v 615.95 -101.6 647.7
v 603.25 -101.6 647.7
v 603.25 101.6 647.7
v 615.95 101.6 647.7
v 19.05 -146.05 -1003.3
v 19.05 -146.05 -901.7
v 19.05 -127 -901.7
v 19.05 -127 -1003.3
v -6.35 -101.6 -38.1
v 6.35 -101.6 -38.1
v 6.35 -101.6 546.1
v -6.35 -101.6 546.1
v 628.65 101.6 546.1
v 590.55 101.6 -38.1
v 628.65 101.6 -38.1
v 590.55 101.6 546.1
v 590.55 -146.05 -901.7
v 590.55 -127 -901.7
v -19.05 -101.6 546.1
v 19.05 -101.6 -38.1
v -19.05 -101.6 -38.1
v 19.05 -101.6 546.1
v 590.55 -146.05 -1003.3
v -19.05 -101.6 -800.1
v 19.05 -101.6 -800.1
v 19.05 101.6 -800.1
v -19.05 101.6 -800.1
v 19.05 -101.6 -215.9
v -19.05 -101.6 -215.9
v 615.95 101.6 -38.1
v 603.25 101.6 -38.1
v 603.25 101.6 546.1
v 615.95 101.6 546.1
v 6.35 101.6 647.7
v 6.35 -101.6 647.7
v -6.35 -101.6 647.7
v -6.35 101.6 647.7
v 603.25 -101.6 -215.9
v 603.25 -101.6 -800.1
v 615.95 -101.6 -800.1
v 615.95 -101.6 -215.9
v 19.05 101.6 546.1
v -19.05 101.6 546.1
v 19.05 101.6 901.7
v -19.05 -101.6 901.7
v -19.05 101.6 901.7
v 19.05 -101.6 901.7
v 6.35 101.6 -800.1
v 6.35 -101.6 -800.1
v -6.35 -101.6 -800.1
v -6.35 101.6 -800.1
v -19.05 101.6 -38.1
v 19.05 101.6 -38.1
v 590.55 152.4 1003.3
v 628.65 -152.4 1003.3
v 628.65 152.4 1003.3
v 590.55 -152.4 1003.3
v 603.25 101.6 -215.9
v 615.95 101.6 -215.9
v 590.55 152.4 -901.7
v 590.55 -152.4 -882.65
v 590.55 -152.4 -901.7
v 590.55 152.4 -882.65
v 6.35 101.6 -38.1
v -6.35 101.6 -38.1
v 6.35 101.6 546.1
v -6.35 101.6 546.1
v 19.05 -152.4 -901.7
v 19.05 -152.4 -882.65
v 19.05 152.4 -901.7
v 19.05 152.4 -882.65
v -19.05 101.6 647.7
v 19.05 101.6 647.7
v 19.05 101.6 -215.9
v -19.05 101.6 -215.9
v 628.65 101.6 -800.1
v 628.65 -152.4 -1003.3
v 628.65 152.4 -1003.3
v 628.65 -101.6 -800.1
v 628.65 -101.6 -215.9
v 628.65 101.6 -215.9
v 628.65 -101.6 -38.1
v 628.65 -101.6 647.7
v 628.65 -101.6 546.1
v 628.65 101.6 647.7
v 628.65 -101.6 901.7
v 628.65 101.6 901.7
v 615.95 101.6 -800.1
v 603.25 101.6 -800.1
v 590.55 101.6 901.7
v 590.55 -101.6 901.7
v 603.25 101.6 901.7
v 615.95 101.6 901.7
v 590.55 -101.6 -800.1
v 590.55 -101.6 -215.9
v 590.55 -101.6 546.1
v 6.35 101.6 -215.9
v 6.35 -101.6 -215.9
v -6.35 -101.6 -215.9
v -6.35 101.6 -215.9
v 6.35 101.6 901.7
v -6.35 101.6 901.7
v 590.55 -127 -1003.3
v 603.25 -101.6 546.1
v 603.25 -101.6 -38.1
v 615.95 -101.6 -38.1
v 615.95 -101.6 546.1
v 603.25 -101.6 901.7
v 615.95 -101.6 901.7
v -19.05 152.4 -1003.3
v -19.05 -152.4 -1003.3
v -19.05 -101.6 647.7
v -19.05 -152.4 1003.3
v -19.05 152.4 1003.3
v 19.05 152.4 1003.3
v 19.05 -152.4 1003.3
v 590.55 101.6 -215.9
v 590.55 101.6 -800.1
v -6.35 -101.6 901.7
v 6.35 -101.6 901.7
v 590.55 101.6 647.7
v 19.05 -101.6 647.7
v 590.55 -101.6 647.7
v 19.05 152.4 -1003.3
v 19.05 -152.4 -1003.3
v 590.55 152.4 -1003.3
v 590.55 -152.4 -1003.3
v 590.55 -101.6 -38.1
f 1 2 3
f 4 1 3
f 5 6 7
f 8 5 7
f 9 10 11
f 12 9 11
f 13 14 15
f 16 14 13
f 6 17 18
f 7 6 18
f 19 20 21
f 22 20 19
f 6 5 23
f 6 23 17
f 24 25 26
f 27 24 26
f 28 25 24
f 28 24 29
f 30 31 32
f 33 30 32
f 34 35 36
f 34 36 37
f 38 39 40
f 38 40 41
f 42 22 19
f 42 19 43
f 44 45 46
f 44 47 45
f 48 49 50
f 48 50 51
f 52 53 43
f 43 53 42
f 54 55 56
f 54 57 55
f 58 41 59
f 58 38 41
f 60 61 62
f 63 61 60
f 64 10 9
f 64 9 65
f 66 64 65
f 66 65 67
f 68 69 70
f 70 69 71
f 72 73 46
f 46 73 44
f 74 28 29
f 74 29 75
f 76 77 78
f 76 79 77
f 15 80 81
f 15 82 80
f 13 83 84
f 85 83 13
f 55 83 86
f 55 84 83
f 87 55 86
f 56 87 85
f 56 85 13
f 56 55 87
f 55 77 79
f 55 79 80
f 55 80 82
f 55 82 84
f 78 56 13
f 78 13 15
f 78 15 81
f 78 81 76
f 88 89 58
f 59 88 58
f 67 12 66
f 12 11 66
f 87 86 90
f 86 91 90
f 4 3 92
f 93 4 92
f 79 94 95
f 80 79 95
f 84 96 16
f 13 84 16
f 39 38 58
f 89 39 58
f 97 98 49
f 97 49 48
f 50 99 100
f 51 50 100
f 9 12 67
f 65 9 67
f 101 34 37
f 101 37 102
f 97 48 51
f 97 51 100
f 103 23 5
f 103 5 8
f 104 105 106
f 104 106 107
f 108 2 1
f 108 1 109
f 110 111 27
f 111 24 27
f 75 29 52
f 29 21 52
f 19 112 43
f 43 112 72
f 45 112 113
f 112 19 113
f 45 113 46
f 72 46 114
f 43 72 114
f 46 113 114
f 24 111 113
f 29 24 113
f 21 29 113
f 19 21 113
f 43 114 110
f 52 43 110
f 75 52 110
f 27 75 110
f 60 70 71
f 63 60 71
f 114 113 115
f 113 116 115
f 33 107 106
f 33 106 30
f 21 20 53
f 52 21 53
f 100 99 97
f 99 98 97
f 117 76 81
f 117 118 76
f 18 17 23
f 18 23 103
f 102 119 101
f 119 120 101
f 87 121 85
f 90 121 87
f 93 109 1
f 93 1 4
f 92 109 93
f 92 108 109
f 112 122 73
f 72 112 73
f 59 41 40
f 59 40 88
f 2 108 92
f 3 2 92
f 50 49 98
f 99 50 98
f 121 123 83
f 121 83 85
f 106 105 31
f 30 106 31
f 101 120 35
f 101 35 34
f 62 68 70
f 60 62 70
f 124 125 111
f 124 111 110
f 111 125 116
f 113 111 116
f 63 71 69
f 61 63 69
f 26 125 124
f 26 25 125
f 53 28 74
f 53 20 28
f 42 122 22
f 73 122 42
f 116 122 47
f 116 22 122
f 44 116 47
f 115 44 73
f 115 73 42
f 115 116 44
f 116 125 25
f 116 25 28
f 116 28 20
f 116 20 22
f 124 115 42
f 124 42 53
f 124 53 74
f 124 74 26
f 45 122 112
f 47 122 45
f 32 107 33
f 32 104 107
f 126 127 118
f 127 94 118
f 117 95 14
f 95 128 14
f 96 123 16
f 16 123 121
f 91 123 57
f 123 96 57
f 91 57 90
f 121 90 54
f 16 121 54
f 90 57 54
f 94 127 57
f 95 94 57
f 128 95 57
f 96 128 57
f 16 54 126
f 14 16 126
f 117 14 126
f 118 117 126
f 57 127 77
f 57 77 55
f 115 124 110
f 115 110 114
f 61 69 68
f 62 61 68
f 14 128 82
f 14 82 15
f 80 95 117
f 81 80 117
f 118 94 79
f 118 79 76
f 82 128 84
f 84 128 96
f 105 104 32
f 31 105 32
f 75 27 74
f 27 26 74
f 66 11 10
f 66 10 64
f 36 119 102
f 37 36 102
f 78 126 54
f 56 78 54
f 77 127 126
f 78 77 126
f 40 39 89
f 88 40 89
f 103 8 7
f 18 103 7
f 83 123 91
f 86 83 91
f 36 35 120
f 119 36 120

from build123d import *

# Parameters (mm, degrees)
F0_W     = 304.8
F0_H     = 2006.6
F0_W_2   = 203.2
F0_H_2   = 584.2
F0_H_3   = 254
F1_DEPTH = 19.05
F2_DEPTH = 6.35
F5_W     = 19.05
F5_H     = 101.6
F6_DEPTH = 571.5
F8_DEPTH = 571.5


with BuildPart() as f1:
    # F0 (on Right) → F1 (new body, symmetric)
    with BuildSketch(Plane.YZ):
        Rectangle(F0_W, F0_H)
        with Locations((0, -508)):
            Rectangle(F0_W_2, F0_H_2, mode=Mode.SUBTRACT)
        with Locations((0, 254)):
            Rectangle(F0_W_2, F0_H_2, mode=Mode.SUBTRACT)
        with Locations((0, 774.7)):
            Rectangle(F0_W_2, F0_H_3, mode=Mode.SUBTRACT)
    extrude(amount=F1_DEPTH, both=True)


with BuildPart() as f2:
    # F0 (on Right) → F2 (new body, symmetric)
    with BuildSketch(Plane.YZ):
        with Locations((0, 774.7)):
            Rectangle(F0_W_2, F0_H_3)
    extrude(amount=F2_DEPTH, both=True)


with BuildPart() as f2b:
    # F0 (on Right) → F2, piece 2 (new body, symmetric)
    with BuildSketch(Plane.YZ):
        with Locations((0, 254)):
            Rectangle(F0_W_2, F0_H_2)
    extrude(amount=F2_DEPTH, both=True)


with BuildPart() as f2c:
    # F0 (on Right) → F2, piece 3 (new body, symmetric)
    with BuildSketch(Plane.YZ):
        with Locations((0, -508)):
            Rectangle(F0_W_2, F0_H_2)
    extrude(amount=F2_DEPTH, both=True)


with BuildPart() as f4_1:
    # F4: instance of F1
    add(f1.part.mirror(Plane.YZ.offset(304.8)))


with BuildPart() as f4_2:
    # F4: instance of F2c
    add(f2c.part.mirror(Plane.YZ.offset(304.8)))


with BuildPart() as f4_3:
    # F4: instance of F2b
    add(f2b.part.mirror(Plane.YZ.offset(304.8)))


with BuildPart() as f4_4:
    # F4: instance of F2
    add(f2.part.mirror(Plane.YZ.offset(304.8)))


with BuildPart() as f6:
    # F5 (on face) → F6 (new body, through all)
    with BuildSketch(Plane.YZ.offset(19.05)):
        with Locations((-136.5250061512, -952.5)):
            Rectangle(F5_W, F5_H)
    extrude(amount=F6_DEPTH)


with BuildPart() as f8:
    # F7 (on face) → F8 (new body, through all)
    with BuildSketch(Plane.YZ.offset(19.05)):
        Polygon((-152.4, -901.7), (-146.0500061512, -901.7), (-127.0000061512, -901.7), (152.4, -901.7), (152.4, -882.65), (-152.4, -882.65), align=None)
    extrude(amount=F8_DEPTH)


solid = Compound([f1.part, f2.part, f2b.part, f2c.part, f4_1.part, f4_2.part, f4_3.part, f4_4.part, f6.part, f8.part])
